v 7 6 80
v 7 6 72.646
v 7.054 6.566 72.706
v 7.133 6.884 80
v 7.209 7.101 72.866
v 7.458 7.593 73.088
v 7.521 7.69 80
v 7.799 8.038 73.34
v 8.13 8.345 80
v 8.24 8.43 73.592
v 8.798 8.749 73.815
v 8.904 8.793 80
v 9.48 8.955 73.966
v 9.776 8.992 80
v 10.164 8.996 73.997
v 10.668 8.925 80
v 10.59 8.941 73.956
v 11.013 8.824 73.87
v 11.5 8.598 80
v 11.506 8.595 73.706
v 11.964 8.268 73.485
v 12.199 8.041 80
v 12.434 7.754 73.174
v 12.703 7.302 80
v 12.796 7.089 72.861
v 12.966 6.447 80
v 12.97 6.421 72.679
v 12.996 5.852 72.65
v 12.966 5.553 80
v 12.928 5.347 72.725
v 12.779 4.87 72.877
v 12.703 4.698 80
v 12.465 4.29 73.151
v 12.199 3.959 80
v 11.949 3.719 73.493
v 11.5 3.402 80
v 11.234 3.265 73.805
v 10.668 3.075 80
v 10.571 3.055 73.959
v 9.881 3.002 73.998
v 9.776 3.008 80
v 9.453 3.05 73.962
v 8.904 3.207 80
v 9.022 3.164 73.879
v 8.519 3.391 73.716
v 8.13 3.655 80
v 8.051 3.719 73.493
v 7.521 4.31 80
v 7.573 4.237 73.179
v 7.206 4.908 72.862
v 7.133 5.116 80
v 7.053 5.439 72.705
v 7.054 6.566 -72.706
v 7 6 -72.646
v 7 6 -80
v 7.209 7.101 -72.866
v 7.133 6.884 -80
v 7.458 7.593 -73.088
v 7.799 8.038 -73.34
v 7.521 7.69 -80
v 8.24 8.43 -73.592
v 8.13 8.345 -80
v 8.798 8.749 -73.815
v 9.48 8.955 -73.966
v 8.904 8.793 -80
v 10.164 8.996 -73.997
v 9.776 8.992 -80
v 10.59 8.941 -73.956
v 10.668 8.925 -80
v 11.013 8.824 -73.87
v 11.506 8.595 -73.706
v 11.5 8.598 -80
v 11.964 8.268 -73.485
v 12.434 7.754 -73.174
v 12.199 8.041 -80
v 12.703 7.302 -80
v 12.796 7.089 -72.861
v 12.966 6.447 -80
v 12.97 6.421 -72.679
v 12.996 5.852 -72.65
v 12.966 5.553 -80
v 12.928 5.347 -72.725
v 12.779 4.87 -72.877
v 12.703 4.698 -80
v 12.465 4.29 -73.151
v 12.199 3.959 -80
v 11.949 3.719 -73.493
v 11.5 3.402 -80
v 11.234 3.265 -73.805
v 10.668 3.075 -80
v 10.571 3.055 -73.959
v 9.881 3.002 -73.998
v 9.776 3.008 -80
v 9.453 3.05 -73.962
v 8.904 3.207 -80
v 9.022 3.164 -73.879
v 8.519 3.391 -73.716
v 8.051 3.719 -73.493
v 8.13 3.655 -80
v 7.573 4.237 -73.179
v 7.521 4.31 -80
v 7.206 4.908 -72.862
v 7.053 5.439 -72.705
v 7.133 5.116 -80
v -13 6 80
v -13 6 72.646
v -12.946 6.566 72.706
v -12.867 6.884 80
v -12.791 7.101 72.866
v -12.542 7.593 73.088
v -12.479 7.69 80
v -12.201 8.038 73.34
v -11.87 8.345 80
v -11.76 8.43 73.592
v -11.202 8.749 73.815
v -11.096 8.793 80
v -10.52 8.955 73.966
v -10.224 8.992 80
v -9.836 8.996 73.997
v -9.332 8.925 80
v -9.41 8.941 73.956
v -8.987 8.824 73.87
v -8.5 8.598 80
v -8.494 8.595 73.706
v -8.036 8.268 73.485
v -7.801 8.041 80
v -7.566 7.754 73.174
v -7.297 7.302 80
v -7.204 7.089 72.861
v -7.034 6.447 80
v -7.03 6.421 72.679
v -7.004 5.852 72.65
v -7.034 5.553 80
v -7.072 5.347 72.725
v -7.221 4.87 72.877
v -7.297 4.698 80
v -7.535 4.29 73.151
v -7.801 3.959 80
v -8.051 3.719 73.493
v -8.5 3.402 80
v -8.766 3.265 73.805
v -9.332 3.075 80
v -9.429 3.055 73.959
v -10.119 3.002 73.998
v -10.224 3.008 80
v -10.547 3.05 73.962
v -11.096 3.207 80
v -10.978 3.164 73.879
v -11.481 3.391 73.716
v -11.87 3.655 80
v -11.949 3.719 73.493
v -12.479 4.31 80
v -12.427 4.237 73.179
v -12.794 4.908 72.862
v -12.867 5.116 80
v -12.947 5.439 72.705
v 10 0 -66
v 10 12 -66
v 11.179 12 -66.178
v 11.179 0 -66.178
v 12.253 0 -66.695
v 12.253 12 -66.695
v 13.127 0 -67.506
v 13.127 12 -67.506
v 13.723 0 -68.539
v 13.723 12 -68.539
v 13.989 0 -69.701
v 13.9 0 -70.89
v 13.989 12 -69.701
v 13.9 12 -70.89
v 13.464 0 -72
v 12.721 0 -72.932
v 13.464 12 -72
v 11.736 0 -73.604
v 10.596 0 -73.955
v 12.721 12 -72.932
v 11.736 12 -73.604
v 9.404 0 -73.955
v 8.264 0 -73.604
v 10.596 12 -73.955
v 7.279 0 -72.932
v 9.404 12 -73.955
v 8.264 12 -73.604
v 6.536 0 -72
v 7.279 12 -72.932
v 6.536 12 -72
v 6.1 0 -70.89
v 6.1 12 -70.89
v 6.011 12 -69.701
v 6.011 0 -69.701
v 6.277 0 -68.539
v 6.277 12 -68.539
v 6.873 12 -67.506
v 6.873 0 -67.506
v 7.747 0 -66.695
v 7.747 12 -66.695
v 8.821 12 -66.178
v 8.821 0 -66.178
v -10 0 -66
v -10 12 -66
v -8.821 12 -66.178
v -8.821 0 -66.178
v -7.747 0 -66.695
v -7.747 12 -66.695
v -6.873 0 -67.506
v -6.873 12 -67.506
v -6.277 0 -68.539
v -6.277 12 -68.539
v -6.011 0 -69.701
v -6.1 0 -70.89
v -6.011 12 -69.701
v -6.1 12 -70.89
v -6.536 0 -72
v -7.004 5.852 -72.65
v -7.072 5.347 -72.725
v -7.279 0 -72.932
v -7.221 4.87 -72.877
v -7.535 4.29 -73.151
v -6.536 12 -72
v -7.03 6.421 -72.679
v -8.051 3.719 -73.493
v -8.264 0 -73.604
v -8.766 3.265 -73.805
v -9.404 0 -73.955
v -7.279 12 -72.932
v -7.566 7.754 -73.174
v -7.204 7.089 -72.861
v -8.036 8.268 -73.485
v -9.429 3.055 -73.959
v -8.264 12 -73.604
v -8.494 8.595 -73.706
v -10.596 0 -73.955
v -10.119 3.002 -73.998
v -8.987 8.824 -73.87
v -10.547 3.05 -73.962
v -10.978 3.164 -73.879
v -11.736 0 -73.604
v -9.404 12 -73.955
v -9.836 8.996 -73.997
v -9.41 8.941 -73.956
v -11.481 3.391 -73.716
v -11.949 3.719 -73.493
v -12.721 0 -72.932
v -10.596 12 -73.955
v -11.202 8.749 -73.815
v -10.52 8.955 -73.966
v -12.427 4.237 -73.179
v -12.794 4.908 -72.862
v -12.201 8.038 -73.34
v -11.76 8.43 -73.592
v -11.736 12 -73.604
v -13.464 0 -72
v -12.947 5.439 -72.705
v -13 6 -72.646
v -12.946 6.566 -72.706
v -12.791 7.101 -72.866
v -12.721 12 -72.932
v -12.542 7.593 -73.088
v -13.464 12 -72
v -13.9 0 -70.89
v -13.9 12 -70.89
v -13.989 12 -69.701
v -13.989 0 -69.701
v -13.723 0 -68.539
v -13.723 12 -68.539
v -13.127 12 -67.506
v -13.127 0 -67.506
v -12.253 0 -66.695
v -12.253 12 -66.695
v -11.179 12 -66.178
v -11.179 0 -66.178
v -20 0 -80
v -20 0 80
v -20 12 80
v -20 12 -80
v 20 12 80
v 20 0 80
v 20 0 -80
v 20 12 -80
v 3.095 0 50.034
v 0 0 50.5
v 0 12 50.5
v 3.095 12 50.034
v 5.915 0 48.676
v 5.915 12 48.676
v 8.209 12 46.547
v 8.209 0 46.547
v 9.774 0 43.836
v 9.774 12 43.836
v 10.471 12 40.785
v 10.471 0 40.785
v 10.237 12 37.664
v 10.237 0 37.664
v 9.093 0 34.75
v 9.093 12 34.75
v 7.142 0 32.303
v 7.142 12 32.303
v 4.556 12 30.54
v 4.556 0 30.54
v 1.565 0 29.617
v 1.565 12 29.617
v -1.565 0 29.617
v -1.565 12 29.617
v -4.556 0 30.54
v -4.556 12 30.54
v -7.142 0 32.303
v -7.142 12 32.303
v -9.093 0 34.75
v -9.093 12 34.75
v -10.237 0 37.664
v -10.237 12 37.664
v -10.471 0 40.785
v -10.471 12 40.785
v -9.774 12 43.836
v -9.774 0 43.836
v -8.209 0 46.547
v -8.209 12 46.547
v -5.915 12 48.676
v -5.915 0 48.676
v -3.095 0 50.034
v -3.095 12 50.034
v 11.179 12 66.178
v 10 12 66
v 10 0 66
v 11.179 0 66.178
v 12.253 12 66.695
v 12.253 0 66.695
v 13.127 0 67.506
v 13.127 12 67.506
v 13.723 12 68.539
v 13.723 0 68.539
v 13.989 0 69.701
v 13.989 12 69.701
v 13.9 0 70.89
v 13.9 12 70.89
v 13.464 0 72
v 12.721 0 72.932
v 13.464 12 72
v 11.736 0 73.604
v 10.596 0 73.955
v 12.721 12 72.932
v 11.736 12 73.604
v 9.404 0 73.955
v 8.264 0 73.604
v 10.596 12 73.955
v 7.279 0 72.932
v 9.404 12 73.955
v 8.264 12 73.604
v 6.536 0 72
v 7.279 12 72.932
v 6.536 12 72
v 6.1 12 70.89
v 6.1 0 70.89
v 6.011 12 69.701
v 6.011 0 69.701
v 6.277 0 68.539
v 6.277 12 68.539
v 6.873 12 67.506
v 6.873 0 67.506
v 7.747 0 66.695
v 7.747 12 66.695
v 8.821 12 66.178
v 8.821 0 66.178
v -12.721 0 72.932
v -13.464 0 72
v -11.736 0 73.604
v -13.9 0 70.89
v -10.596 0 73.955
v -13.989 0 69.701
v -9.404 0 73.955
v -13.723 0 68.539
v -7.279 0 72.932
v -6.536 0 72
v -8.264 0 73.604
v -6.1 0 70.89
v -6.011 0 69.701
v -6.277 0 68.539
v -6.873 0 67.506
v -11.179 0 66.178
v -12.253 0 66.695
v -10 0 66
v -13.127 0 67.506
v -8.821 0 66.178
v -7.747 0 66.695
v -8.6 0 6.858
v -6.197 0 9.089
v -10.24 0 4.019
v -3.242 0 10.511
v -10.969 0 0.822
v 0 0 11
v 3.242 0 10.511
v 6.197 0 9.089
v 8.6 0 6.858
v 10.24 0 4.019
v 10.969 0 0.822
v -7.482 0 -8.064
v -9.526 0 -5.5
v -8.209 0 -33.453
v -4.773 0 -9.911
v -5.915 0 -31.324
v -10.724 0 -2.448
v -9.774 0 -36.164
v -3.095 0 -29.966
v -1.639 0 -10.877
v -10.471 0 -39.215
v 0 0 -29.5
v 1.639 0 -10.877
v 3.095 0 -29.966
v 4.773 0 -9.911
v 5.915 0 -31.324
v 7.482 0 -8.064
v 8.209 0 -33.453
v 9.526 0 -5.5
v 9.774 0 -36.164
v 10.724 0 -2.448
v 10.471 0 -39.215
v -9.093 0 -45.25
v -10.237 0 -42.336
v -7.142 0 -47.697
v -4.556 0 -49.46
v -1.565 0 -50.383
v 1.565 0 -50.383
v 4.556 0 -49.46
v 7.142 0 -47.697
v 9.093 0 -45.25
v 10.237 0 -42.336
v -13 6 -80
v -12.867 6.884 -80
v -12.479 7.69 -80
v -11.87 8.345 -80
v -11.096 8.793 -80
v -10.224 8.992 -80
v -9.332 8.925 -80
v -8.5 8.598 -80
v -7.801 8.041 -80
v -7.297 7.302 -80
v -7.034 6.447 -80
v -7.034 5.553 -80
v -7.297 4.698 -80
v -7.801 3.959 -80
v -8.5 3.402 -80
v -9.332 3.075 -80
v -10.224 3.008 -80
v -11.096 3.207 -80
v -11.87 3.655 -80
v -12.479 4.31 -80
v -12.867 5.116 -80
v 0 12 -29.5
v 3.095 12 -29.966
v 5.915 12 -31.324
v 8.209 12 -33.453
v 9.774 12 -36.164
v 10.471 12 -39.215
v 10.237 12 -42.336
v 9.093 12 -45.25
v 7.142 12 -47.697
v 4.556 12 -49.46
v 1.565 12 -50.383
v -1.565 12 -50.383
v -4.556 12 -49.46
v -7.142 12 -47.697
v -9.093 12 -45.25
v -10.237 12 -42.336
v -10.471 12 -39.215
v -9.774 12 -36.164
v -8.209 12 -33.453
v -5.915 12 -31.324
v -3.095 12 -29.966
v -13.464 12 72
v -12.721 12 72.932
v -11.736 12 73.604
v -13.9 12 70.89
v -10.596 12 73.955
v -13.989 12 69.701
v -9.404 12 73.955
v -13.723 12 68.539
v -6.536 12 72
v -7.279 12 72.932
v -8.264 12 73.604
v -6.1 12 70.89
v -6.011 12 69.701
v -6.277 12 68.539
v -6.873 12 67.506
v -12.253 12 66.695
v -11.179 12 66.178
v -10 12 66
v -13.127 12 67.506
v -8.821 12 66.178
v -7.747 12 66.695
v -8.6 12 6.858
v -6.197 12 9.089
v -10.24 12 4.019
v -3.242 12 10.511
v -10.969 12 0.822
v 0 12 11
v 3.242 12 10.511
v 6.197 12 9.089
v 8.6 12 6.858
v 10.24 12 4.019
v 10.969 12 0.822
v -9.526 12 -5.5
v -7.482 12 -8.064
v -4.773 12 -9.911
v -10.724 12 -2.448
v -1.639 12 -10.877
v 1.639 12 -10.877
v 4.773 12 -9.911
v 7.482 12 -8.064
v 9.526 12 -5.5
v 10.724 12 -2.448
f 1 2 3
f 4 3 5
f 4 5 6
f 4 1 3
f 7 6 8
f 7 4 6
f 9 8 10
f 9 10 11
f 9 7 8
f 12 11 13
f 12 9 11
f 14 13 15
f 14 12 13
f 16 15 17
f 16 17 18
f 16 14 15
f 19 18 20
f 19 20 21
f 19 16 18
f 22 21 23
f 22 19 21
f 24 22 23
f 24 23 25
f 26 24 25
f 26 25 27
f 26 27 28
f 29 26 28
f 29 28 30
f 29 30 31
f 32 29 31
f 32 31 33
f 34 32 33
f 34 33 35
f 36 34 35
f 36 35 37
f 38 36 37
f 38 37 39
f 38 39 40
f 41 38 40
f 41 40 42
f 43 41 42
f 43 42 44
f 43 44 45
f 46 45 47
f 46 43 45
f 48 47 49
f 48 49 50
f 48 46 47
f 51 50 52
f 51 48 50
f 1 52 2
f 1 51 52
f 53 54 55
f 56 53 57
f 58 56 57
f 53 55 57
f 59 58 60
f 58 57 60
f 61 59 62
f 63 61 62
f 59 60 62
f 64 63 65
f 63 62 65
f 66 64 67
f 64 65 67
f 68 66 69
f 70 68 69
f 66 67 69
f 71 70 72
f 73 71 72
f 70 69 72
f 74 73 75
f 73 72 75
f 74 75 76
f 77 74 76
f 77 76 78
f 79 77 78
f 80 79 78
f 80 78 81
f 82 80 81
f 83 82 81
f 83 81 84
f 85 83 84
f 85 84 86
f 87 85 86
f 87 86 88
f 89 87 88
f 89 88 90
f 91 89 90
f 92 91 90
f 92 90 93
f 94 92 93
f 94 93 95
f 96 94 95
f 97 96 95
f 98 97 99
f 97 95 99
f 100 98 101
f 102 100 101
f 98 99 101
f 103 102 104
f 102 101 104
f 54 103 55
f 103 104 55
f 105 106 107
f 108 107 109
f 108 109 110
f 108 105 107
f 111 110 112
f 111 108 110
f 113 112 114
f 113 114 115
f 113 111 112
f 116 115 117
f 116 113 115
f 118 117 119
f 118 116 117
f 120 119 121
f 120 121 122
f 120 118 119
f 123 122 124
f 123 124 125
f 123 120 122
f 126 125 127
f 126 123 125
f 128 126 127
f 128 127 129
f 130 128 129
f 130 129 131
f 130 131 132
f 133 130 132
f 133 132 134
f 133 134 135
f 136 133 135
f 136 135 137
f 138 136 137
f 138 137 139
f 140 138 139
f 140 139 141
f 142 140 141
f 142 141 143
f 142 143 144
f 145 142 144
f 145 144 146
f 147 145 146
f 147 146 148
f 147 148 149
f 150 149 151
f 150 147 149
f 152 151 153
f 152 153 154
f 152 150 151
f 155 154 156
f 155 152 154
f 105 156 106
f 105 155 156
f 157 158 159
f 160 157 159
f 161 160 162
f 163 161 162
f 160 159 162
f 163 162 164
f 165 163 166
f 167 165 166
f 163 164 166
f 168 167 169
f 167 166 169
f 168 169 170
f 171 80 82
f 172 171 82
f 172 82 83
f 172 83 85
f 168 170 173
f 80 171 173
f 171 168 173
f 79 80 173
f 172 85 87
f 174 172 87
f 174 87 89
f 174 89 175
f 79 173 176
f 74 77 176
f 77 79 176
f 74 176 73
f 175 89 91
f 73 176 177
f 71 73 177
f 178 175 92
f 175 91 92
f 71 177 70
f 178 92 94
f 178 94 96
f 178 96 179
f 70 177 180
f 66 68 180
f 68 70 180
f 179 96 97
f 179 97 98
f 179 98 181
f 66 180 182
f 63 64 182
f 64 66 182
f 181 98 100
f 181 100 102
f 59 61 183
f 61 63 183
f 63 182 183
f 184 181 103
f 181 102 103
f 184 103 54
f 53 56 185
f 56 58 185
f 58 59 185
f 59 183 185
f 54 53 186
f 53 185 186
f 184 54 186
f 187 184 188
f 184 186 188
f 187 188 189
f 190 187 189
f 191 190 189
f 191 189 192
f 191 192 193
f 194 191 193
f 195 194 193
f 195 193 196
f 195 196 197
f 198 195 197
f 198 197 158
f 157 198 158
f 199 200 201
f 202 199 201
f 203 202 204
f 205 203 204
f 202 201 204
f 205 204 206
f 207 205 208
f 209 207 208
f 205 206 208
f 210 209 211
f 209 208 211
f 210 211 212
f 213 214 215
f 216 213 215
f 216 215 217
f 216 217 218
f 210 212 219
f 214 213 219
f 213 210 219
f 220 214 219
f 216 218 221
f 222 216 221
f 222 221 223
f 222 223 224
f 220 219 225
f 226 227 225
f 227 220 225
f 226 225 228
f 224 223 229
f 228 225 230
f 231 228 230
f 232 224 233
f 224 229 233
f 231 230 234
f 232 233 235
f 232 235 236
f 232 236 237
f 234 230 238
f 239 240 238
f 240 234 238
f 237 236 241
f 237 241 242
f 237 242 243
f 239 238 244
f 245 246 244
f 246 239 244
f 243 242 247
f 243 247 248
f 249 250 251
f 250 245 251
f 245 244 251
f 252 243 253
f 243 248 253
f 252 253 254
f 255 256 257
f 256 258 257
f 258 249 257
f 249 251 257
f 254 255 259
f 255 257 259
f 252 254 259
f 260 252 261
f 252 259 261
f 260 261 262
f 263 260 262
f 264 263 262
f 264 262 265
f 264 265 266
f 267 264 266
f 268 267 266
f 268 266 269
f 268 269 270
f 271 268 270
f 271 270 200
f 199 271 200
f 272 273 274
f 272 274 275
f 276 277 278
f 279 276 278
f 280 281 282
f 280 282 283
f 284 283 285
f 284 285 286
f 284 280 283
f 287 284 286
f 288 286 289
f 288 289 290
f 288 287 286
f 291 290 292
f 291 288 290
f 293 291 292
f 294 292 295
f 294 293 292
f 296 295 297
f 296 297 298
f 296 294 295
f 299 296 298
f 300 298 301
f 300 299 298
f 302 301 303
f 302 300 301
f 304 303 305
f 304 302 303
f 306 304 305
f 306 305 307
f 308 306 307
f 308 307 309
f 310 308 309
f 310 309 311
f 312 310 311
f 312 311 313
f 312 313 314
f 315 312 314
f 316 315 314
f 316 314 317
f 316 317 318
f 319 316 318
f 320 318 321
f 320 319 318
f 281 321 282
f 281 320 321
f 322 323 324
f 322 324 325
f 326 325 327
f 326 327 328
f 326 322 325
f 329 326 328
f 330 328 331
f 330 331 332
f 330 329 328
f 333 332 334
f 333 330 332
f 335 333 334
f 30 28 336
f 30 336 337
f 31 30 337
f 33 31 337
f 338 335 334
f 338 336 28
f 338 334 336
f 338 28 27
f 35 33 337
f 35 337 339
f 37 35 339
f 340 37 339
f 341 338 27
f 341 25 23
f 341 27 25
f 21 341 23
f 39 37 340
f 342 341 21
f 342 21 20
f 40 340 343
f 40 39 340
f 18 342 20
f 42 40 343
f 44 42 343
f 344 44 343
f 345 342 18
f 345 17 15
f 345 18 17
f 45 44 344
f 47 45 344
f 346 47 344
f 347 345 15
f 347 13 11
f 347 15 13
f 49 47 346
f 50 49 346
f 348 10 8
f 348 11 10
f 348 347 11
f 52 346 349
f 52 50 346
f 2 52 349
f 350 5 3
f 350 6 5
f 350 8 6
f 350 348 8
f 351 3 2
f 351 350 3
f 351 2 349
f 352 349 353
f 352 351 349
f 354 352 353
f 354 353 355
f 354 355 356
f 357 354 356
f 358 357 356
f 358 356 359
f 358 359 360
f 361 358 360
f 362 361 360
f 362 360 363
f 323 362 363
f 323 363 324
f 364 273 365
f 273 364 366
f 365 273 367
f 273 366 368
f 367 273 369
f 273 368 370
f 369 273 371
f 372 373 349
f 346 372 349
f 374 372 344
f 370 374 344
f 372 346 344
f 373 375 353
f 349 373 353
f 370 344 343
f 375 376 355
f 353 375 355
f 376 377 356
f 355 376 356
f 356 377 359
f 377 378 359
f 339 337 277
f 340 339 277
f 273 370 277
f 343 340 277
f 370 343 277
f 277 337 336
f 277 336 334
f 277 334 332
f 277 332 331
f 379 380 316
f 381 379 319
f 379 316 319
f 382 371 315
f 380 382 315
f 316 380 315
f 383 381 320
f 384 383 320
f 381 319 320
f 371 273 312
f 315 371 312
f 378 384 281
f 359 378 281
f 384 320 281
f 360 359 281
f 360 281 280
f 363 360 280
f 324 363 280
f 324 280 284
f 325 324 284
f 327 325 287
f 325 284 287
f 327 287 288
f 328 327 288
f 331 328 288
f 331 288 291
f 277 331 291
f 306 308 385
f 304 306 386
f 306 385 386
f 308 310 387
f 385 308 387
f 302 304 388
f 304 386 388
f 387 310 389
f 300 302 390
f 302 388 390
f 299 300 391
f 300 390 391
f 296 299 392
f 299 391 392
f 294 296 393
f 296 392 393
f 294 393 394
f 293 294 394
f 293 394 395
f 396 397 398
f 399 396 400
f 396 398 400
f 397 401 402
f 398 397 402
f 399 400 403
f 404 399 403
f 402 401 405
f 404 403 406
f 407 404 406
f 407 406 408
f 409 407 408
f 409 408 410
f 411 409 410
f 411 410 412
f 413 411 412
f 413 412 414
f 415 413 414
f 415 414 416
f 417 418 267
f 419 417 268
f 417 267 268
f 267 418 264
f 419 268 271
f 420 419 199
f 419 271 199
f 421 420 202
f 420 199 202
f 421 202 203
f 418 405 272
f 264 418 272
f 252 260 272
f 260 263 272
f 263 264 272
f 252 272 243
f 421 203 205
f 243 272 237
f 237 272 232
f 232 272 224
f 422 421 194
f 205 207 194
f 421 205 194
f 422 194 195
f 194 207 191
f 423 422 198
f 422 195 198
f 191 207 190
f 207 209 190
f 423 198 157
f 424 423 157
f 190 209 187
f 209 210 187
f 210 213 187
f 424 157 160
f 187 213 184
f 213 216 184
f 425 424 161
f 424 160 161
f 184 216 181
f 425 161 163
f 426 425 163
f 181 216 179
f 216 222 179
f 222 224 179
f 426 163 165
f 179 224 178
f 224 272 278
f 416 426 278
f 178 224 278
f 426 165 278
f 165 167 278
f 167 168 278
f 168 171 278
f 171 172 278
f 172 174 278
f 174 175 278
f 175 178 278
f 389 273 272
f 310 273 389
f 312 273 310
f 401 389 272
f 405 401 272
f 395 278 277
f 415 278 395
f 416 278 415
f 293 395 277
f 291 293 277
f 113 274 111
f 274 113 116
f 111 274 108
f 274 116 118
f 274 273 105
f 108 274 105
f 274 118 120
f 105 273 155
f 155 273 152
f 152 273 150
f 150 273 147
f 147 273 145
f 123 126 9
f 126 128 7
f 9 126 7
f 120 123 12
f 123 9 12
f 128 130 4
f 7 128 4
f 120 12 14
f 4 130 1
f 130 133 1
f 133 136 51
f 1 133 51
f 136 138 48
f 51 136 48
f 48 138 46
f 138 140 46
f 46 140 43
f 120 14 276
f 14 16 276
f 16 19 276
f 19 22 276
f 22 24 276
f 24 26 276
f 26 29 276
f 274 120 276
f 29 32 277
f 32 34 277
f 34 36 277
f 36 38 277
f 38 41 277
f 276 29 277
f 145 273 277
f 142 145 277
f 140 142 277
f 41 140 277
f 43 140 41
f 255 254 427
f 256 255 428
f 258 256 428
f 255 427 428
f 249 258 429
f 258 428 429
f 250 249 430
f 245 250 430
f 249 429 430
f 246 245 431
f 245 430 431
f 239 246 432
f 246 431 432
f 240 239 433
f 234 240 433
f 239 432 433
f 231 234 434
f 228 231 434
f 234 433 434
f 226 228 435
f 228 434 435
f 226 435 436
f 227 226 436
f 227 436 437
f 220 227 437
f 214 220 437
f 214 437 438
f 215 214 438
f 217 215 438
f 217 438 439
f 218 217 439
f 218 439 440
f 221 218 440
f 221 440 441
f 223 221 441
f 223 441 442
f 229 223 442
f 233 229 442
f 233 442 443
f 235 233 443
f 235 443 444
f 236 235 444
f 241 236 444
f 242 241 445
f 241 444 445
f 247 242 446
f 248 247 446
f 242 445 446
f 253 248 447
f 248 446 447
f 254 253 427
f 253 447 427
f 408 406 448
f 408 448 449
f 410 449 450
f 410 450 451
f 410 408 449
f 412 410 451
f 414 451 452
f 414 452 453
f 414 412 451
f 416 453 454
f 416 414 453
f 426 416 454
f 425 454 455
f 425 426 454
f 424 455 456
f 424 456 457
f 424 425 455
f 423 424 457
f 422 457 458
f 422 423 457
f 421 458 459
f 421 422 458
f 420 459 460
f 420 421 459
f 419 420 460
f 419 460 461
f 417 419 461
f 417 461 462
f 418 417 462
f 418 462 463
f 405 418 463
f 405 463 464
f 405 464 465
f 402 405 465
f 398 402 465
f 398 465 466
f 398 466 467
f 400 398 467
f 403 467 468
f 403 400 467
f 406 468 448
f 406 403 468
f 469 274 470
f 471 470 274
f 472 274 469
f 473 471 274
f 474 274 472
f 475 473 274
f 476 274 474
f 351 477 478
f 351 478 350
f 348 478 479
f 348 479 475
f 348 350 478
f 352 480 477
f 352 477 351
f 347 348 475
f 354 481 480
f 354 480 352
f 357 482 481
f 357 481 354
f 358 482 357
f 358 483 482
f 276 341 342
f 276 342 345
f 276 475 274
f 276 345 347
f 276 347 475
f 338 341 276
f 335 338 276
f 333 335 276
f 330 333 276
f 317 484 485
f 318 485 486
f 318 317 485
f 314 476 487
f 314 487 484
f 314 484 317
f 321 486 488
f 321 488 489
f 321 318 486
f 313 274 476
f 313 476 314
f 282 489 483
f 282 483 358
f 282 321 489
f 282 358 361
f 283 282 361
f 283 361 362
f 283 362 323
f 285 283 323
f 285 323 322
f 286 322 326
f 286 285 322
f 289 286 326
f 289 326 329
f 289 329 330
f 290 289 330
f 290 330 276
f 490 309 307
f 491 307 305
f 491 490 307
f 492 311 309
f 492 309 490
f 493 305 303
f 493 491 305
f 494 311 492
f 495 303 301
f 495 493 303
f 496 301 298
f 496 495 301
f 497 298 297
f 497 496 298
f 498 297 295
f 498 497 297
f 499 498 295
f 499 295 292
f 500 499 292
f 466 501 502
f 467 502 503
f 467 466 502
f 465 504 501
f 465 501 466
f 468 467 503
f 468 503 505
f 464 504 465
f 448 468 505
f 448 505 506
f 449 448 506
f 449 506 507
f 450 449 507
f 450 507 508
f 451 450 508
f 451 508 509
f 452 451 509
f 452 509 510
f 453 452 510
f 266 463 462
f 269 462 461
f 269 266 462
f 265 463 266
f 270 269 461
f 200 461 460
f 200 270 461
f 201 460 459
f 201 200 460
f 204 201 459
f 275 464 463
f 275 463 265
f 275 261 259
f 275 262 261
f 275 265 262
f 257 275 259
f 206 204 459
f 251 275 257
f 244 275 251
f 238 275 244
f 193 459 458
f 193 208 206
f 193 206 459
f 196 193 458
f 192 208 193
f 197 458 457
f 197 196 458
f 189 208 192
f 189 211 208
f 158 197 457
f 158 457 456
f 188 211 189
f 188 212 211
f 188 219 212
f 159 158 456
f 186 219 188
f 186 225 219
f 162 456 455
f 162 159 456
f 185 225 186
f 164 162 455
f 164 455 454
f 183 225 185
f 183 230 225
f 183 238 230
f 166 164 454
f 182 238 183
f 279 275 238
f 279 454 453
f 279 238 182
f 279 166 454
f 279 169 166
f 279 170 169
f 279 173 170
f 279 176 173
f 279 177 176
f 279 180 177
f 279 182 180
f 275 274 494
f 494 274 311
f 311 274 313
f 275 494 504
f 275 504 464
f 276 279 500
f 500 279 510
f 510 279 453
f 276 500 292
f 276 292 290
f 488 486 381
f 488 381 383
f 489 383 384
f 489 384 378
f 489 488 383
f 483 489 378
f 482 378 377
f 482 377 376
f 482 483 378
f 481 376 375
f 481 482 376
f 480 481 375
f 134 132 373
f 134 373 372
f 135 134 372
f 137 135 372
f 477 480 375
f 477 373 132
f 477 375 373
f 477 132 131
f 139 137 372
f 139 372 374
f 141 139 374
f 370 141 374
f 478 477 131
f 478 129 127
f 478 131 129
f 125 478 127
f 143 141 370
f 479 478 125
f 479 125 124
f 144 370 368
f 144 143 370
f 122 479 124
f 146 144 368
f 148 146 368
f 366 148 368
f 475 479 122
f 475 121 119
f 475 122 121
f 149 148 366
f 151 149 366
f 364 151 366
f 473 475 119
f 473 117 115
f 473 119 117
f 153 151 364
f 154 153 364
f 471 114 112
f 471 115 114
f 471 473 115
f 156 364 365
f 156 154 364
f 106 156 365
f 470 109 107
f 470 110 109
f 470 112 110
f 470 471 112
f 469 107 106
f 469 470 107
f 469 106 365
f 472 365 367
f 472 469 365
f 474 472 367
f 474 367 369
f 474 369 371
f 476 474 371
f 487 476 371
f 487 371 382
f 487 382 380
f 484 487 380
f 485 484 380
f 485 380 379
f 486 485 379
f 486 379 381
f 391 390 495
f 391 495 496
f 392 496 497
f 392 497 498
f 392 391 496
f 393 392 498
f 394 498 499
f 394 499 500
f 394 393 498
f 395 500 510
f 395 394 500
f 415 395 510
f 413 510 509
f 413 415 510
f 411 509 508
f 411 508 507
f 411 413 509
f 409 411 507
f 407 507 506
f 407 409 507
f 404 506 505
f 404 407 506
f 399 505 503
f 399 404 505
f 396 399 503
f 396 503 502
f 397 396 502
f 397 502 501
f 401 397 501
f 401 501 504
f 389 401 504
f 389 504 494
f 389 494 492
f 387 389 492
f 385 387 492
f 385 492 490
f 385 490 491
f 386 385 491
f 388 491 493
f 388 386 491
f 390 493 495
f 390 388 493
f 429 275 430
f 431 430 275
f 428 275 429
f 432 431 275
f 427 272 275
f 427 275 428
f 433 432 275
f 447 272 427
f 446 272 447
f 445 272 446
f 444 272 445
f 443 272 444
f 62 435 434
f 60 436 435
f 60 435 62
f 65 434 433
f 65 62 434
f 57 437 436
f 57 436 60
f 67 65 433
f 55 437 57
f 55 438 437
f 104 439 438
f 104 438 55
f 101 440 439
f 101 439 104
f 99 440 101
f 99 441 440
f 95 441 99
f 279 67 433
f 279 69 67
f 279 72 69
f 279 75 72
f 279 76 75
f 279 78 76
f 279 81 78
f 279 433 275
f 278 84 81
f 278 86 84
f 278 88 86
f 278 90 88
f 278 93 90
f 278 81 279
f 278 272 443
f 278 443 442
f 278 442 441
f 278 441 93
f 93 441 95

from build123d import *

# Parameters (mm, degrees)
SKETCH1_W           = 40
SKETCH1_H           = 160
SKETCH1_R           = 11
SKETCH1_R_2         = 10.5
BOSS_EXTRUDE1_DEPTH = 12
CUT_EXTRUDE3_REACH  = 85.331
SKETCH4_R           = 4
CUT_EXTRUDE4_REACH  = 163.691
SKETCH5_R           = 3


with BuildPart() as part:
    # Sketch1 → Boss-Extrude1 (new body)
    with BuildSketch(Plane(origin=(0, 0, 0), x_dir=(1, 0, 0), z_dir=(0, 1, 0))):
        Rectangle(SKETCH1_W, SKETCH1_H)
        with Locations(Location((0, 0, 0), (0, 0, 270))):
            Circle(SKETCH1_R, mode=Mode.SUBTRACT)
        with Locations(Location((0, 40, 0), (0, 0, 270))):
            Circle(SKETCH1_R_2, mode=Mode.SUBTRACT)
        with Locations(Location((0, -40, 0), (0, 0, 270))):
            Circle(SKETCH1_R_2, mode=Mode.SUBTRACT)
    extrude(amount=BOSS_EXTRUDE1_DEPTH)

    # Sketch4 → Cut-Extrude3 (cut, up to next)
    with BuildSketch(Plane(origin=(0, 12, 0), x_dir=(1, 0, 0), z_dir=(0, 1, 0)), mode=Mode.PRIVATE) as cut_extrude3_sk1:
        with Locations(Location((-10, 70, 0), (0, 0, 270))):
            Circle(SKETCH4_R)
    cut_extrude3_tool1 = extrude(cut_extrude3_sk1.sketch, amount=-CUT_EXTRUDE3_REACH, mode=Mode.PRIVATE) & part.part
    # Sketch4 → Cut-Extrude3 (cut, up to next)
    with BuildSketch(Plane(origin=(0, 12, 0), x_dir=(1, 0, 0), z_dir=(0, 1, 0)), mode=Mode.PRIVATE) as cut_extrude3_sk2:
        with Locations(Location((10, 70, 0), (0, 0, 270))):
            Circle(SKETCH4_R)
    cut_extrude3_tool2 = extrude(cut_extrude3_sk2.sketch, amount=-CUT_EXTRUDE3_REACH, mode=Mode.PRIVATE) & part.part
    cut_extrude3_1 = cut_extrude3_tool1.solids().sort_by_distance((-10, 12, -70))[0]
    add(cut_extrude3_1, mode=Mode.SUBTRACT)
    cut_extrude3_2 = cut_extrude3_tool2.solids().sort_by_distance((10, 12, -70))[0]
    add(cut_extrude3_2, mode=Mode.SUBTRACT)
    cut_extrude3 = cut_extrude3_1 + cut_extrude3_2  # Cut-Extrude3 as one shape, for the pattern or mirror that repeats it

    # Sketch5 → Cut-Extrude4 (cut, up to next)
    with BuildSketch(Plane(origin=(0, 0, -80), x_dir=(-1, 0, 0), z_dir=(0, 0, -1)), mode=Mode.PRIVATE) as cut_extrude4_sk1:
        with Locations((10, 6)):
            Circle(SKETCH5_R)
    cut_extrude4_tool1 = extrude(cut_extrude4_sk1.sketch, amount=-CUT_EXTRUDE4_REACH, mode=Mode.PRIVATE) & part.part
    # Sketch5 → Cut-Extrude4 (cut, up to next)
    with BuildSketch(Plane(origin=(0, 0, -80), x_dir=(-1, 0, 0), z_dir=(0, 0, -1)), mode=Mode.PRIVATE) as cut_extrude4_sk2:
        with Locations((-10, 6)):
            Circle(SKETCH5_R)
    cut_extrude4_tool2 = extrude(cut_extrude4_sk2.sketch, amount=-CUT_EXTRUDE4_REACH, mode=Mode.PRIVATE) & part.part
    cut_extrude4_1 = cut_extrude4_tool1.solids().sort_by_distance((-10, 6, -80))[0]
    add(cut_extrude4_1, mode=Mode.SUBTRACT)
    cut_extrude4_2 = cut_extrude4_tool2.solids().sort_by_distance((10, 6, -80))[0]
    add(cut_extrude4_2, mode=Mode.SUBTRACT)
    cut_extrude4 = cut_extrude4_1 + cut_extrude4_2  # Cut-Extrude4 as one shape, for the pattern or mirror that repeats it

    # Mirror1: Cut-Extrude3, Cut-Extrude4 across plane
    add(cut_extrude3.mirror(Plane.XY), mode=Mode.SUBTRACT)
    add(cut_extrude4.mirror(Plane.XY), mode=Mode.SUBTRACT)


solid = part.part
